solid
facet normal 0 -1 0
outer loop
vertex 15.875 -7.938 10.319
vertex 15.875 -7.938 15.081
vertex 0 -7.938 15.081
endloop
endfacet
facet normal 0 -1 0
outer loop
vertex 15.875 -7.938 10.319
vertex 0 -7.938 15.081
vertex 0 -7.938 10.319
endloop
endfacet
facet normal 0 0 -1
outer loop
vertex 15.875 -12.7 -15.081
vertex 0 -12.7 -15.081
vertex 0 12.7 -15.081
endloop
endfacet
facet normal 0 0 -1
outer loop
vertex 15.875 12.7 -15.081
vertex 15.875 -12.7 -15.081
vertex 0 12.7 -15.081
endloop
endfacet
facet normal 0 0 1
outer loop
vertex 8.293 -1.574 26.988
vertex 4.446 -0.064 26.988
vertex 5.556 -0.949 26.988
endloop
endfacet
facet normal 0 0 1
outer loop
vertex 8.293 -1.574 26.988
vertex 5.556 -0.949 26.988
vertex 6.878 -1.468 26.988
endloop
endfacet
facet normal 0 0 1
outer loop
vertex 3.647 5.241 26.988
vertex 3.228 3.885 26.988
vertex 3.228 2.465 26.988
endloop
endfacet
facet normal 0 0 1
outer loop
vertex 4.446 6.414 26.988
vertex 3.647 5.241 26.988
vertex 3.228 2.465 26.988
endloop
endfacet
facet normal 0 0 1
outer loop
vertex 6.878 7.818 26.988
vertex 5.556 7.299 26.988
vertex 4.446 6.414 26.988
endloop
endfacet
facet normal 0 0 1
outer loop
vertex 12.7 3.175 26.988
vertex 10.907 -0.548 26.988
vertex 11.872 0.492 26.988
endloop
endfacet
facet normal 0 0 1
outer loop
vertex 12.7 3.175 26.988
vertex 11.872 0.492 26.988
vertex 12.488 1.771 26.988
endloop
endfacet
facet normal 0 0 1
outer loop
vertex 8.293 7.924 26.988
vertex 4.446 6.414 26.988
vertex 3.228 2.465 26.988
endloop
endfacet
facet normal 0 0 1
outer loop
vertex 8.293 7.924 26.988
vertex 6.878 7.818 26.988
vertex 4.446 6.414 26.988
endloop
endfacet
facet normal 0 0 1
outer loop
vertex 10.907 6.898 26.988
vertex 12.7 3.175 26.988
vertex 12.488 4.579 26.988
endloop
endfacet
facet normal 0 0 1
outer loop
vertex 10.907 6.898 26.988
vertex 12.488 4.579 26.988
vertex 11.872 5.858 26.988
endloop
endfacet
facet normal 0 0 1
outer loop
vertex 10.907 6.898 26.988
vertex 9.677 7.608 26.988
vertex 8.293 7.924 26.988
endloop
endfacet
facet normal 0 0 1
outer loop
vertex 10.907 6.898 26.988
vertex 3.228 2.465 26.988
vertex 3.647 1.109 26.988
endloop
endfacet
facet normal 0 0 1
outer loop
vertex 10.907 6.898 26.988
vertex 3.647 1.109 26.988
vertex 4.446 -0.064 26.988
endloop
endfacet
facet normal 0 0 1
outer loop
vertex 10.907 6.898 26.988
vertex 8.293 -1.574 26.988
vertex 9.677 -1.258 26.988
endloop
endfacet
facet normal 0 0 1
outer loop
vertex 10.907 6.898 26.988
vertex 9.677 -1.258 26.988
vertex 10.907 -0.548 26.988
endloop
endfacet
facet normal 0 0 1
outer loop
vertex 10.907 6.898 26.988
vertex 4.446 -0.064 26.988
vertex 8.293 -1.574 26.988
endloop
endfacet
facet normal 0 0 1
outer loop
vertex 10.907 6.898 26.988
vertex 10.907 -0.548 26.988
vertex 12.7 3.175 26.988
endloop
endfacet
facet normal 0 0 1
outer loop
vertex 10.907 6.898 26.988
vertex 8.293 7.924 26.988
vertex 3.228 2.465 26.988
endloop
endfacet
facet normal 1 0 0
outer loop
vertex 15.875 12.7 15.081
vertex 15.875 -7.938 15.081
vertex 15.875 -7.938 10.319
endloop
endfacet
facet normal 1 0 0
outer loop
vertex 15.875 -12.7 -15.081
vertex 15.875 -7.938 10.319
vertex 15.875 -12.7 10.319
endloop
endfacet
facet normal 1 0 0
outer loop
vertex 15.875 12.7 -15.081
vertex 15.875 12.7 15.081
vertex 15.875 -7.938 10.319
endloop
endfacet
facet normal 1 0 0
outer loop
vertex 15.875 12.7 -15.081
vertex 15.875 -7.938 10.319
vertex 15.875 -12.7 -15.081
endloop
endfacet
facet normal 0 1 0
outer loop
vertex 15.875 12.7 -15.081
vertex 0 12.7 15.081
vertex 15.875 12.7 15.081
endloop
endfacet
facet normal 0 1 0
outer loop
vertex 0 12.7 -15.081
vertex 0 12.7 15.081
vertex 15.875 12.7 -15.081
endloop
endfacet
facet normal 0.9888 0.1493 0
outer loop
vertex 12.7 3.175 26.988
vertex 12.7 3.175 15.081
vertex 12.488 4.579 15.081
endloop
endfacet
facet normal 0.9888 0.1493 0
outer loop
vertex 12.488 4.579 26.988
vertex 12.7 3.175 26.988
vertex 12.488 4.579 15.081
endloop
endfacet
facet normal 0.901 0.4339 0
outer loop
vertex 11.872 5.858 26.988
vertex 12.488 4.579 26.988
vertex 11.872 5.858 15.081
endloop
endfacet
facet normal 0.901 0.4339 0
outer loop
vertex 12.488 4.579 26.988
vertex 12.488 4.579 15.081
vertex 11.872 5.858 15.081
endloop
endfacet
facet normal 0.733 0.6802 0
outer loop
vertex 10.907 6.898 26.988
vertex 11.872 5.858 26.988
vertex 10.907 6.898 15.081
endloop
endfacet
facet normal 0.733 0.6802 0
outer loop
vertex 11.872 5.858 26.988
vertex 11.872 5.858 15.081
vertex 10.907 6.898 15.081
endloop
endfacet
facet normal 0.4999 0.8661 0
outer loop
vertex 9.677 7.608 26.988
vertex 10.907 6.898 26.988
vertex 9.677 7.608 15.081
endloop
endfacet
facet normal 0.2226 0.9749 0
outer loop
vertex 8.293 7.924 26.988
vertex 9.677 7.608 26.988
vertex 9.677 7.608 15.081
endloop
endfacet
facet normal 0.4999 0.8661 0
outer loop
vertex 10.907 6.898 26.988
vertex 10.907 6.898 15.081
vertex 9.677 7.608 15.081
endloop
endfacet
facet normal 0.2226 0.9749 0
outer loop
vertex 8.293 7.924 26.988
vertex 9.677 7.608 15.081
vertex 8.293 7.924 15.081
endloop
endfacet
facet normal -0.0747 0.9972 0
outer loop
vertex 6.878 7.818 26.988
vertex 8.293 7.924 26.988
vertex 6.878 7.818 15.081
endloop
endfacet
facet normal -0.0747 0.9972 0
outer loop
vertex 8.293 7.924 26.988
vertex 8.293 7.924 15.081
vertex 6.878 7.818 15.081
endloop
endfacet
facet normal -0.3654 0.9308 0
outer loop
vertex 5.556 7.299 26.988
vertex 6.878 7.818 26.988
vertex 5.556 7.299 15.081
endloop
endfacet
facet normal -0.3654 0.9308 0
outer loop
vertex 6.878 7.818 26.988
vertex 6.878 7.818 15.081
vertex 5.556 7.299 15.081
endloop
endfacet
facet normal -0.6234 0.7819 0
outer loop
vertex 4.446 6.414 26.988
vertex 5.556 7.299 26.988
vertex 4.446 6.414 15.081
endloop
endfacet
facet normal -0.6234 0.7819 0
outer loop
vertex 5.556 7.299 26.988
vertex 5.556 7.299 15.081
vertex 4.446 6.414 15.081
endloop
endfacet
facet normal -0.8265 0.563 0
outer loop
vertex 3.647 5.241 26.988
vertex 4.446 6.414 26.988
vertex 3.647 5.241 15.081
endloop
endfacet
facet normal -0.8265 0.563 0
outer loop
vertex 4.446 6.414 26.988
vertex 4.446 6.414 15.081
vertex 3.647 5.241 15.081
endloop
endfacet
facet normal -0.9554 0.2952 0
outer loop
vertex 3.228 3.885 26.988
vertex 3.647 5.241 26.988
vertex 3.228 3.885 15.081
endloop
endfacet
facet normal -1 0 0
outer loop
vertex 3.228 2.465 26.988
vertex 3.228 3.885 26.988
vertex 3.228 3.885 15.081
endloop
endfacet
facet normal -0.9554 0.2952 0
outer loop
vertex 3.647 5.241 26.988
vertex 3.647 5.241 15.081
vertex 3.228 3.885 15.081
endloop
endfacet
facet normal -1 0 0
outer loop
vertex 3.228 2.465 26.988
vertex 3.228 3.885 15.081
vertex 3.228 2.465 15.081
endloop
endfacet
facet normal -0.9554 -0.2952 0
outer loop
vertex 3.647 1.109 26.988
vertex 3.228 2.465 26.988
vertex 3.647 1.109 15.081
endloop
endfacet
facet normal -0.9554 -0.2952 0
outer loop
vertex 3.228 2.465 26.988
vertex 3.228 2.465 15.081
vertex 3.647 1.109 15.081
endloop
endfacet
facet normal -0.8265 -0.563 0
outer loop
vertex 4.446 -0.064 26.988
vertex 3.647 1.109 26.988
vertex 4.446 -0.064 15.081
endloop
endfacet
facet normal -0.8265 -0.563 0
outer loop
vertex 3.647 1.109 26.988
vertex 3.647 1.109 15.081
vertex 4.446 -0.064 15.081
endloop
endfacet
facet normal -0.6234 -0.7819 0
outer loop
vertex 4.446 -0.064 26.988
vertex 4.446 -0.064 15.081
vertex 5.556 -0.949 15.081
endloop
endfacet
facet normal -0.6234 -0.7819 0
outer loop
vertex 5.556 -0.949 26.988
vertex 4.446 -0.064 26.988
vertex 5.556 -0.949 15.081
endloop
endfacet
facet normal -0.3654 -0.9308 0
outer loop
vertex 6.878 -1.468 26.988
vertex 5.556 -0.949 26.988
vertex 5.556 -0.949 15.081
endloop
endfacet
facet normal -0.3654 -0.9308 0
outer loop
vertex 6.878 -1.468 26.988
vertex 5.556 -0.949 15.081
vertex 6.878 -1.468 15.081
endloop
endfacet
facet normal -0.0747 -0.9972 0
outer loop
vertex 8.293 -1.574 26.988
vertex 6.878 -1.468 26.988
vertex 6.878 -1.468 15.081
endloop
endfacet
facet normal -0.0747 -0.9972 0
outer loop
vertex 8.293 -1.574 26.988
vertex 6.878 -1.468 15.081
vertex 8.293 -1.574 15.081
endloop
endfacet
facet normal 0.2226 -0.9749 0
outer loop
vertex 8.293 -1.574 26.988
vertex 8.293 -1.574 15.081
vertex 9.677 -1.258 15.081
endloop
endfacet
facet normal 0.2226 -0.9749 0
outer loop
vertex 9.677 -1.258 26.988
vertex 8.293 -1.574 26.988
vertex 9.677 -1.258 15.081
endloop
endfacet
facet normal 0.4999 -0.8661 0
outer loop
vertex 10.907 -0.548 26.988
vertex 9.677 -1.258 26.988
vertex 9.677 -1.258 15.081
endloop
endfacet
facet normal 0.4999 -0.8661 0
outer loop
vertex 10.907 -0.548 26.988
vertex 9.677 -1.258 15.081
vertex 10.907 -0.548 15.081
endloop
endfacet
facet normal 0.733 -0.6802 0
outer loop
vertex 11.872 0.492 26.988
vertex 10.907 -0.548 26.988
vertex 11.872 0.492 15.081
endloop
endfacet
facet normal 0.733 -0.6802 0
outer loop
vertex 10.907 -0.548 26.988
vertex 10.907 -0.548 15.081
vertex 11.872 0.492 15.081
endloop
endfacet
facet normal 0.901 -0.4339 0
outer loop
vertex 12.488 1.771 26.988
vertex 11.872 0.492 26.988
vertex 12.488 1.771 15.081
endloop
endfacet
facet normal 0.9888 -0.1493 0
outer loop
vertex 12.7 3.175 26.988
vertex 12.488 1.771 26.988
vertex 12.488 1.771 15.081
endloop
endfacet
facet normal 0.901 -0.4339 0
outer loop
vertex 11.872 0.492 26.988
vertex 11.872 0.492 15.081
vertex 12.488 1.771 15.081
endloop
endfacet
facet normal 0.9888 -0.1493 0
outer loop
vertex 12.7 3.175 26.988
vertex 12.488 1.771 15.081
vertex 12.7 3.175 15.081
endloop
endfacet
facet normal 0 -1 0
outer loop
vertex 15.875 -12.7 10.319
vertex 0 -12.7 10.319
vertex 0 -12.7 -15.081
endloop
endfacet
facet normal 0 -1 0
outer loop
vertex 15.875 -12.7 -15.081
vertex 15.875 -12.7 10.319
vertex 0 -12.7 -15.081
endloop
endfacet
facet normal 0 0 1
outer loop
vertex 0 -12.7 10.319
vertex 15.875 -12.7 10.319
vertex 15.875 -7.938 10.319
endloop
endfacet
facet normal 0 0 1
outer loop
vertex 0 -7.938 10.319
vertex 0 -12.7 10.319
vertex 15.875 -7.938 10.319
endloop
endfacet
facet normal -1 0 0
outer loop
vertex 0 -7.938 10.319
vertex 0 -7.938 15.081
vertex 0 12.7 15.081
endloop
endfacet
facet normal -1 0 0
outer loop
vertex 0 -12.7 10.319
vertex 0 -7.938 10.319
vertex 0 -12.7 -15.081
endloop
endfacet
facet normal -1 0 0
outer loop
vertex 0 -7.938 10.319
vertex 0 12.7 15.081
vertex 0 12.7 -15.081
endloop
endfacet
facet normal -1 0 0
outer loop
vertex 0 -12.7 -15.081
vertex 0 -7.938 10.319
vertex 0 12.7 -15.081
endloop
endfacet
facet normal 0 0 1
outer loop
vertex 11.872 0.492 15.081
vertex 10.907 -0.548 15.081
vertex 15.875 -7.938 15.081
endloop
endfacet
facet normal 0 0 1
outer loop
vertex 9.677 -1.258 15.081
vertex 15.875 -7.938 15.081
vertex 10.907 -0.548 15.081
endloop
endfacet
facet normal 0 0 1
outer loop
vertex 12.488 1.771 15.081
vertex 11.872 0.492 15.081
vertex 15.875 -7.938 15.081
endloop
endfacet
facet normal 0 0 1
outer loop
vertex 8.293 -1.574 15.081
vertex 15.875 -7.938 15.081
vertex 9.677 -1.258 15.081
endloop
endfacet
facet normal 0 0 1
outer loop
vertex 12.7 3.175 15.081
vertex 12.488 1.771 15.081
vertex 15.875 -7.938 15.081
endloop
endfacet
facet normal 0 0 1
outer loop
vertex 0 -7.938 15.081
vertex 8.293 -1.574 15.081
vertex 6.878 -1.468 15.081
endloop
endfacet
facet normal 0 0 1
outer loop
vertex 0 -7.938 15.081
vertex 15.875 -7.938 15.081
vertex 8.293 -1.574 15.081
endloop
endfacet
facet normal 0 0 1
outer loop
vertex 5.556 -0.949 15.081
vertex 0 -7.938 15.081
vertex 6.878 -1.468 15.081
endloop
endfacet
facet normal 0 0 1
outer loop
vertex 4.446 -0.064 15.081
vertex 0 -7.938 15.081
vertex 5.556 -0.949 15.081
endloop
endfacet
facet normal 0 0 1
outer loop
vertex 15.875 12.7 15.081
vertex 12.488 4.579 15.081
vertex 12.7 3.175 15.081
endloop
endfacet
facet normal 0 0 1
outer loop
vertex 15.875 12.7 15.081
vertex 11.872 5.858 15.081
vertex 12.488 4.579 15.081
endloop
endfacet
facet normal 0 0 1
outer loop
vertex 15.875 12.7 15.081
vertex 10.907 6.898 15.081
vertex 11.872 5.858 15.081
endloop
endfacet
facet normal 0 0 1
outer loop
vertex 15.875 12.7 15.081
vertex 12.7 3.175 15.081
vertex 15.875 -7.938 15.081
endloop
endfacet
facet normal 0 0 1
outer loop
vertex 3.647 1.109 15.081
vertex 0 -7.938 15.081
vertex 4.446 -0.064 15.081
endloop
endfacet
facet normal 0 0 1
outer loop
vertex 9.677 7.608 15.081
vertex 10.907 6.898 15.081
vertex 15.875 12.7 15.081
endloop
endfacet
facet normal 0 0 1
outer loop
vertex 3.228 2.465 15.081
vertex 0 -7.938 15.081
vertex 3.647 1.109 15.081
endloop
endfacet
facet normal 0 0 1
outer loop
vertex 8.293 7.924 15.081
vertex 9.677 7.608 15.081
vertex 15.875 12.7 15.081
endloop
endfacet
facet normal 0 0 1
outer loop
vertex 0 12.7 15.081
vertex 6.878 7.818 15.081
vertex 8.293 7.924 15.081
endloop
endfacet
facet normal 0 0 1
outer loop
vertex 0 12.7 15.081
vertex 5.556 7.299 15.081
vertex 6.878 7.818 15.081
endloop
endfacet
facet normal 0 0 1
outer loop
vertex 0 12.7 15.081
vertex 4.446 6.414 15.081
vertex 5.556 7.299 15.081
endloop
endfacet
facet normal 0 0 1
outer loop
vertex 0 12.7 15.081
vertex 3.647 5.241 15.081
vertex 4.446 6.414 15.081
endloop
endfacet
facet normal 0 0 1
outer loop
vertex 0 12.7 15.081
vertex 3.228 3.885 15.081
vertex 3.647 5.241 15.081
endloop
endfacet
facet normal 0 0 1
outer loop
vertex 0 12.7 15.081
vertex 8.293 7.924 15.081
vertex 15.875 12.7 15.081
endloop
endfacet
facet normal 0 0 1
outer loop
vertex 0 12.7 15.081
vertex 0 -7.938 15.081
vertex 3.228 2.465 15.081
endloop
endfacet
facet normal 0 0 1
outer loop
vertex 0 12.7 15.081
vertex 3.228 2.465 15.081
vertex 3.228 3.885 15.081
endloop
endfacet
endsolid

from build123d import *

# Parameters (mm, degrees)
SKETCH1_W           = 30.1625
SKETCH1_H           = 25.4
BOSS_EXTRUDE1_DEPTH = 15.875
SKETCH2_R           = 4.7625
BOSS_EXTRUDE2_DEPTH = 11.90625
SKETCH3_W           = 4.7625
SKETCH3_H           = 4.7625
CUT_EXTRUDE1_DEPTH  = 16.875


with BuildPart() as part:
    # Sketch1 → Boss-Extrude1 (new body)
    with BuildSketch(Plane(origin=(0, 0, 0), x_dir=(0, 0, -1), z_dir=(1, 0, 0))):
        Rectangle(SKETCH1_W, SKETCH1_H)
    extrude(amount=BOSS_EXTRUDE1_DEPTH)

    # Sketch2 → Boss-Extrude2 (add)
    with BuildSketch(Plane.XY.offset(15.08125)):
        with Locations((7.9375, 3.175)):
            Circle(SKETCH2_R)
    extrude(amount=BOSS_EXTRUDE2_DEPTH)

    # Sketch3 → Cut-Extrude1 (cut, through all)
    with BuildSketch(Plane(origin=(15.875, 0, 0), x_dir=(0, 0, -1), z_dir=(1, 0, 0))):
        with Locations((-12.7, -10.31875)):
            Rectangle(SKETCH3_W, SKETCH3_H)
    extrude(amount=-CUT_EXTRUDE1_DEPTH, mode=Mode.SUBTRACT)


solid = part.part
